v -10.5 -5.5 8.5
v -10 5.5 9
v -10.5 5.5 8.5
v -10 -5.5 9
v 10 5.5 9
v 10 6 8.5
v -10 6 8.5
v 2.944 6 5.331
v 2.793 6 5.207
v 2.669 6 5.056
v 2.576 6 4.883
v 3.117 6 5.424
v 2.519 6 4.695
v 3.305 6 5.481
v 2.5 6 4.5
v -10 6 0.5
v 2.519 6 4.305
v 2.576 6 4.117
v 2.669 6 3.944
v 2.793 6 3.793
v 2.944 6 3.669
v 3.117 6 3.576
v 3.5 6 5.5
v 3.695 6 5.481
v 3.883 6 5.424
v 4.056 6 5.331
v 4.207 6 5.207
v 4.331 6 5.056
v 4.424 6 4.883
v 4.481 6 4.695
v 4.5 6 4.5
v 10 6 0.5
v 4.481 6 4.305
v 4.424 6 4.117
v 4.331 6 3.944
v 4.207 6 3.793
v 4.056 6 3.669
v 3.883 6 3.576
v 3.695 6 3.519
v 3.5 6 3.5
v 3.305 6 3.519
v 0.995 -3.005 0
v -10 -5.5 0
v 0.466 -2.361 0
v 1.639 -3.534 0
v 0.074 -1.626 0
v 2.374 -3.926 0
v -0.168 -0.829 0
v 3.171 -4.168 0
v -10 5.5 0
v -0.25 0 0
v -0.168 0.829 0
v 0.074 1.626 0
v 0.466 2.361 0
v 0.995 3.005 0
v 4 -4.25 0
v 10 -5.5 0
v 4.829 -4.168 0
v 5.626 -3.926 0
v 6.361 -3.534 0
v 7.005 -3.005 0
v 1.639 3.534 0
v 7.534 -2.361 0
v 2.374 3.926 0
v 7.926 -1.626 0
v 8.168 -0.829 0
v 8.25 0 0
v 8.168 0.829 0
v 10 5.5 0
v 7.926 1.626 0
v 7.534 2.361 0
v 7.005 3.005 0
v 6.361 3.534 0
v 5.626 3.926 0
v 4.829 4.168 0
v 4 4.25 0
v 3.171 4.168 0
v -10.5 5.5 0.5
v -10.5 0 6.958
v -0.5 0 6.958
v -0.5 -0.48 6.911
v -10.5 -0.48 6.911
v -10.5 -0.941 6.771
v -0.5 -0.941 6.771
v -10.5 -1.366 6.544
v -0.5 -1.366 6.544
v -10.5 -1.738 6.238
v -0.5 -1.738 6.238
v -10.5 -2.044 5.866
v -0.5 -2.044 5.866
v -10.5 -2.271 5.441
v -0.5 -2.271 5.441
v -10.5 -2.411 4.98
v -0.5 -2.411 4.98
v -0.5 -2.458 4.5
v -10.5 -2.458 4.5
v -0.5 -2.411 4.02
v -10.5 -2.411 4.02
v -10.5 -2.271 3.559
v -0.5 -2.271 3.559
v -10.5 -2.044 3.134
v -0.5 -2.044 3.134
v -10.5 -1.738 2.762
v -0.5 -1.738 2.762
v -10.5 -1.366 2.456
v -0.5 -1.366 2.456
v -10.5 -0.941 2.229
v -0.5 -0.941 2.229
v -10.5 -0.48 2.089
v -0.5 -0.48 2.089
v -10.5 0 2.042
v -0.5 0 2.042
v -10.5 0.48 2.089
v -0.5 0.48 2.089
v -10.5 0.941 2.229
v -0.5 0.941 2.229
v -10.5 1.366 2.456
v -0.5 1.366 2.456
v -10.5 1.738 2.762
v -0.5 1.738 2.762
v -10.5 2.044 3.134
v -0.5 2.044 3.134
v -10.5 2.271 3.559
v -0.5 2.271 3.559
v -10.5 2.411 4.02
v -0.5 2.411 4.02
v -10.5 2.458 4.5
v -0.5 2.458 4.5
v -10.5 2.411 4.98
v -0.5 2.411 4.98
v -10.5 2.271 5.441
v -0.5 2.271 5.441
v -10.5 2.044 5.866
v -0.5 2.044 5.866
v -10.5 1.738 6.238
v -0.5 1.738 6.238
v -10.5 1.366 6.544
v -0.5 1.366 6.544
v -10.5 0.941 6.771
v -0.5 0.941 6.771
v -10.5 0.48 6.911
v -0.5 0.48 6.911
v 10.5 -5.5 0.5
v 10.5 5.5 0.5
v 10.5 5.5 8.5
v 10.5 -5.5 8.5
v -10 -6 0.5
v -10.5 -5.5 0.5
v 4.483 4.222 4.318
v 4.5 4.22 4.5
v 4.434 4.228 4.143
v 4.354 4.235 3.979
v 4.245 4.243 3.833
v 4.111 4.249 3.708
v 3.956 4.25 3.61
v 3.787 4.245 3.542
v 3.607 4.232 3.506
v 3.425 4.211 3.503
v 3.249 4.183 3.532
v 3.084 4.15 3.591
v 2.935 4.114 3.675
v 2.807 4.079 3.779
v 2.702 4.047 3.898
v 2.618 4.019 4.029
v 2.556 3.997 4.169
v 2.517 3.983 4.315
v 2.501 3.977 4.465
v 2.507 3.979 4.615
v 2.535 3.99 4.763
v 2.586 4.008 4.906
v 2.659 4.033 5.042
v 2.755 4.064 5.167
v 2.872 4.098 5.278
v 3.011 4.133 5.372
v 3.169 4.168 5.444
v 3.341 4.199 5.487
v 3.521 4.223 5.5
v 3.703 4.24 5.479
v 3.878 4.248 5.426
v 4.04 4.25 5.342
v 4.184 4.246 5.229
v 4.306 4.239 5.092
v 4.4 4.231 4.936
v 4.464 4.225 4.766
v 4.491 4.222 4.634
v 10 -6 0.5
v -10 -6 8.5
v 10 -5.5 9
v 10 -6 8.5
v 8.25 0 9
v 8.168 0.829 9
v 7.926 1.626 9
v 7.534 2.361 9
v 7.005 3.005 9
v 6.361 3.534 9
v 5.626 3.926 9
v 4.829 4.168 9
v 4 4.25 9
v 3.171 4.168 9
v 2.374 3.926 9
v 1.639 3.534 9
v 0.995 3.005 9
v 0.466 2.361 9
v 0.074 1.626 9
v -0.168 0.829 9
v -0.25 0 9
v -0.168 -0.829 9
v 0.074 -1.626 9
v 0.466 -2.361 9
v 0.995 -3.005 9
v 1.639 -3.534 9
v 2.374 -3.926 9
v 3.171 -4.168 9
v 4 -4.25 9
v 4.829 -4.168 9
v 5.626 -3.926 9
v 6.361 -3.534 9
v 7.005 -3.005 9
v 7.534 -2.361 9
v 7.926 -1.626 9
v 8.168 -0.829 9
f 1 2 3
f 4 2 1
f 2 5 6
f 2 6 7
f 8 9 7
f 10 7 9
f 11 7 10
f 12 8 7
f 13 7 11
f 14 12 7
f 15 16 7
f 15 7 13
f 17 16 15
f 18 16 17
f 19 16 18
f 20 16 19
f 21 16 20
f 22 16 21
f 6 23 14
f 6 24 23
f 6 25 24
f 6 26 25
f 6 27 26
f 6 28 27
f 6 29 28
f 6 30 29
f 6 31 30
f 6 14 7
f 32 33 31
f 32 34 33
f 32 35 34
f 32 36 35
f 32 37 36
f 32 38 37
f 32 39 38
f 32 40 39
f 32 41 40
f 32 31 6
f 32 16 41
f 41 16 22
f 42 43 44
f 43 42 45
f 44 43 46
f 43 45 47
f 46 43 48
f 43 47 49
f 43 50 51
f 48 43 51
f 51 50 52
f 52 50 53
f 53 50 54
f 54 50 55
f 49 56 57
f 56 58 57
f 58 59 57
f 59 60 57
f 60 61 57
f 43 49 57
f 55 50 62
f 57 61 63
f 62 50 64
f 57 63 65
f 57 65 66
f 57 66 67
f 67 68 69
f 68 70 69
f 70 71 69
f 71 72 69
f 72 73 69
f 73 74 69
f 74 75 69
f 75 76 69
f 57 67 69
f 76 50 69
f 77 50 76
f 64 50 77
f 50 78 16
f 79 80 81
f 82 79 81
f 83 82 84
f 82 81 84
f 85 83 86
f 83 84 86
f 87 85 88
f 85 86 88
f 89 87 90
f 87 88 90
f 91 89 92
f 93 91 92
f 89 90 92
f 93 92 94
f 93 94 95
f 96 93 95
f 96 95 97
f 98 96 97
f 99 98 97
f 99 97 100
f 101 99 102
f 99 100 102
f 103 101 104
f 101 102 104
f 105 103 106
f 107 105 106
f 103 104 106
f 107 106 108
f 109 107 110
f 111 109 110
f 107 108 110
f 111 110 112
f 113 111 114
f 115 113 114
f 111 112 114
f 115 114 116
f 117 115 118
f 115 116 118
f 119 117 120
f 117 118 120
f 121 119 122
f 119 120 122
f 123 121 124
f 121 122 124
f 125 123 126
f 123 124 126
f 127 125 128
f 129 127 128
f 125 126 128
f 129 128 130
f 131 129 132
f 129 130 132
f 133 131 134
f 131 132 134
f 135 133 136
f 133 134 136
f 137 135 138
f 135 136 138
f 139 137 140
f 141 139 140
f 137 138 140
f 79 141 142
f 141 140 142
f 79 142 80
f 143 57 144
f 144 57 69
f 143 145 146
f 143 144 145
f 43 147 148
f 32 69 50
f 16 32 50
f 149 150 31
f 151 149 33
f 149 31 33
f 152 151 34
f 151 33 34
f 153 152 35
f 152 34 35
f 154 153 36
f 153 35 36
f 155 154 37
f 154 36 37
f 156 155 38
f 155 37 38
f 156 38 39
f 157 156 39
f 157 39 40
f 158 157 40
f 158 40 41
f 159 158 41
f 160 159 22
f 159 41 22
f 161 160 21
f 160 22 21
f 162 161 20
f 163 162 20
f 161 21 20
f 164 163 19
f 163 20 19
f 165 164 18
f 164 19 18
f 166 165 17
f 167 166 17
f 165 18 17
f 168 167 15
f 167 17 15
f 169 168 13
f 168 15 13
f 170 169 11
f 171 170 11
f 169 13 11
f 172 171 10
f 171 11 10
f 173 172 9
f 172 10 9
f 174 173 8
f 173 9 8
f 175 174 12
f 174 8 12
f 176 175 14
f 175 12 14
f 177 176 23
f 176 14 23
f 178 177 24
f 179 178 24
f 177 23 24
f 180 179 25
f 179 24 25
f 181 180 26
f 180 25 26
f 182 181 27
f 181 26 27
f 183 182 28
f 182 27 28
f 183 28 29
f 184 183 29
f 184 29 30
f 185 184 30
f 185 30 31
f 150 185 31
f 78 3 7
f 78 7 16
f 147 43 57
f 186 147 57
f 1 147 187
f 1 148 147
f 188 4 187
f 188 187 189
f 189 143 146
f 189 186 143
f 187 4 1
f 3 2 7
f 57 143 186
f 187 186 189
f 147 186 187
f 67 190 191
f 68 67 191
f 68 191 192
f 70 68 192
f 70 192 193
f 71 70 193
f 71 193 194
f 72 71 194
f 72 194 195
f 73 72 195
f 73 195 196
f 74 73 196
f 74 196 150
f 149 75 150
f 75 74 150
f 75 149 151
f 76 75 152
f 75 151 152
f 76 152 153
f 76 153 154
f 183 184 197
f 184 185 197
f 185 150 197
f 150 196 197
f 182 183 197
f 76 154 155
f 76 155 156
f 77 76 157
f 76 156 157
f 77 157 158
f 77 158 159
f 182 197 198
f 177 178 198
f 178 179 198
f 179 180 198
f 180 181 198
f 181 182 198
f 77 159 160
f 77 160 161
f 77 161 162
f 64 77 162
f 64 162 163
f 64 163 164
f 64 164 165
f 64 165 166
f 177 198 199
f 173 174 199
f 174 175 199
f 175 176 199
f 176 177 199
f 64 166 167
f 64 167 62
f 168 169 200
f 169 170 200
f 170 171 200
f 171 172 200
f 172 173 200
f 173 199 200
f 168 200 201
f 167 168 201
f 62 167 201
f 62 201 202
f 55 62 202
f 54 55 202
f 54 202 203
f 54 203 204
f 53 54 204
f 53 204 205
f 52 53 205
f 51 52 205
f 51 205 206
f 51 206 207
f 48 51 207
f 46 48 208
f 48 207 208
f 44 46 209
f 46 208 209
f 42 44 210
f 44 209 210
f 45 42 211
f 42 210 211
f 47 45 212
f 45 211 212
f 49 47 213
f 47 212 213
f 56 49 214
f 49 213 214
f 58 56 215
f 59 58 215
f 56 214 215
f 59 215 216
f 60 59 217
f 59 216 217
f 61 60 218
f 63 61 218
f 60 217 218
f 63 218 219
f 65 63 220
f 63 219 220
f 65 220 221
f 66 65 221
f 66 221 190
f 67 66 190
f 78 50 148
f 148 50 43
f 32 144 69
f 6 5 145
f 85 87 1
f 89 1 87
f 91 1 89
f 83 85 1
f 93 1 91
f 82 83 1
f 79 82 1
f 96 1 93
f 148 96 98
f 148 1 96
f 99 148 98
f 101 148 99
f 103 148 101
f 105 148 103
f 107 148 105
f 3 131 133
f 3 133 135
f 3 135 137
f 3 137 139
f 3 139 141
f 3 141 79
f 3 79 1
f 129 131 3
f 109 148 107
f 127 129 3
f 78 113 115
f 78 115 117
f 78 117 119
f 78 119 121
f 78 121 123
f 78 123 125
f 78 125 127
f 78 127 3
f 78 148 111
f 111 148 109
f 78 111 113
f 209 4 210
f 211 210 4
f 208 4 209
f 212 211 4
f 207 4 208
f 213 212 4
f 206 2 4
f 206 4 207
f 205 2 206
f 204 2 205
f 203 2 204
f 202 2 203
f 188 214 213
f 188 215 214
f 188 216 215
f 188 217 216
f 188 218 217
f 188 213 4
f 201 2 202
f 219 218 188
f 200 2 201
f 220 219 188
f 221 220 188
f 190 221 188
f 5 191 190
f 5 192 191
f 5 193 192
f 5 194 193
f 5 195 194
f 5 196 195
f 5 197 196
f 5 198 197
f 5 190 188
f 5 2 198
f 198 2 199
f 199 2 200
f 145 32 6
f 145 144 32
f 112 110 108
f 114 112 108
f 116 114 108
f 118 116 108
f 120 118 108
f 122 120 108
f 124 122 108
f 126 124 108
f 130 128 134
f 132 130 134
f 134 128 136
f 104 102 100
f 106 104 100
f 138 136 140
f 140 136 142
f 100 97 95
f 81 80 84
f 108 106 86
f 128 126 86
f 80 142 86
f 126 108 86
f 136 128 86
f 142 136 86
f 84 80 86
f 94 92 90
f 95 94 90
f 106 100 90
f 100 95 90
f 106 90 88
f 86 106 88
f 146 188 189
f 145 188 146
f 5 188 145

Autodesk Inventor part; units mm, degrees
ref_plane "YZ Plane" through (0, 0, 0) normal (1, 0, 0) x (0, 1, 0)
ref_plane "XZ Plane" through (0, 0, 0) normal (0, 1, 0) x (-1, 0, 0)
ref_plane "XY Plane" through (0, 0, 0) normal (0, 0, 1) x (1, 0, 0)
sketch "Sketch1" plane through (0, 0, 0) normal (0, 0, 1) x (1, 0, 0)
  line L0 (-10.5, 6) -> (10.5, 6)
  line L1 (10.5, 6) -> (10.5, -6)
  line L2 (10.5, -6) -> (-10.5, -6)
  line L3 (-10.5, -6) -> (-10.5, 6)
  line L4 (-10.5, 6) -> (10.5, -6) construction
  line L5 (10.5, 6) -> (-10.5, -6) construction
  point P0 (0, 0)
  dimension "d0" = 21
  dimension "d1" = 12
extrude "Extrusion1" add sketch "Sketch1" along normal blind 9
chamfer "Chamfer1" distance 0.5 angle 45 12 edges at (0, 6, 9) (-10.5, 0, 9) (10.5, 0, 9) (0, -6, 9) (10.5, 6, 4.5) (10.5, -6, 4.5) (10.5, 0, 0) (-10.5, 6, 4.5) (-10.5, -6, 4.5) (0, -6, 0) (-10.5, 0, 0) (0, 6, 0)
sketch "Sketch2" plane through (0, 0, 9) normal (0, 0, 1) x (1, 0, 0)
  circle A0 centre (4, 0) radius 4.25
  line L0 (10.5, -5.5) -> (10.5, 5.5) projected
  point P0 (0, 0)
  dimension "d7" = 8.5
  dimension "d8" = 6.5
extrude "Extrusion2" cut sketch "Sketch2" against normal through all
sketch "Sketch3" plane through (-10, 6, 0.5) normal (0, 1, 0) x (1, 0, 0)
  line L0 (20, 0) -> (20, -8) projected
  circle A0 centre (13.5, -4) radius 1
  point P0 (10, 0.5)
  point P1 (20, -4)
  point P2 (20, -4)
  dimension "d11" = 2
  dimension "d12" = 6.5
extrude "Extrusion3" cut sketch "Sketch3" against normal up to surface
sketch "Sketch4" plane through (-10.5, -5.5, 0.5) normal (-1, 0, 0) x (0, 0, 1)
  point P0 (-0.5, 5.5)
  point P1 (4, 5.5)
hole "Hole1" at (-10.5, 0, 4.5) direction (1, 0, 0) diameter 4.917 depth 10 thread size "M6x1" class "6H" standard "ANSI Metric M Profile"
properties part number "16B2 - Con Head Big End" material "Steel AISI 1020 107 HR"
